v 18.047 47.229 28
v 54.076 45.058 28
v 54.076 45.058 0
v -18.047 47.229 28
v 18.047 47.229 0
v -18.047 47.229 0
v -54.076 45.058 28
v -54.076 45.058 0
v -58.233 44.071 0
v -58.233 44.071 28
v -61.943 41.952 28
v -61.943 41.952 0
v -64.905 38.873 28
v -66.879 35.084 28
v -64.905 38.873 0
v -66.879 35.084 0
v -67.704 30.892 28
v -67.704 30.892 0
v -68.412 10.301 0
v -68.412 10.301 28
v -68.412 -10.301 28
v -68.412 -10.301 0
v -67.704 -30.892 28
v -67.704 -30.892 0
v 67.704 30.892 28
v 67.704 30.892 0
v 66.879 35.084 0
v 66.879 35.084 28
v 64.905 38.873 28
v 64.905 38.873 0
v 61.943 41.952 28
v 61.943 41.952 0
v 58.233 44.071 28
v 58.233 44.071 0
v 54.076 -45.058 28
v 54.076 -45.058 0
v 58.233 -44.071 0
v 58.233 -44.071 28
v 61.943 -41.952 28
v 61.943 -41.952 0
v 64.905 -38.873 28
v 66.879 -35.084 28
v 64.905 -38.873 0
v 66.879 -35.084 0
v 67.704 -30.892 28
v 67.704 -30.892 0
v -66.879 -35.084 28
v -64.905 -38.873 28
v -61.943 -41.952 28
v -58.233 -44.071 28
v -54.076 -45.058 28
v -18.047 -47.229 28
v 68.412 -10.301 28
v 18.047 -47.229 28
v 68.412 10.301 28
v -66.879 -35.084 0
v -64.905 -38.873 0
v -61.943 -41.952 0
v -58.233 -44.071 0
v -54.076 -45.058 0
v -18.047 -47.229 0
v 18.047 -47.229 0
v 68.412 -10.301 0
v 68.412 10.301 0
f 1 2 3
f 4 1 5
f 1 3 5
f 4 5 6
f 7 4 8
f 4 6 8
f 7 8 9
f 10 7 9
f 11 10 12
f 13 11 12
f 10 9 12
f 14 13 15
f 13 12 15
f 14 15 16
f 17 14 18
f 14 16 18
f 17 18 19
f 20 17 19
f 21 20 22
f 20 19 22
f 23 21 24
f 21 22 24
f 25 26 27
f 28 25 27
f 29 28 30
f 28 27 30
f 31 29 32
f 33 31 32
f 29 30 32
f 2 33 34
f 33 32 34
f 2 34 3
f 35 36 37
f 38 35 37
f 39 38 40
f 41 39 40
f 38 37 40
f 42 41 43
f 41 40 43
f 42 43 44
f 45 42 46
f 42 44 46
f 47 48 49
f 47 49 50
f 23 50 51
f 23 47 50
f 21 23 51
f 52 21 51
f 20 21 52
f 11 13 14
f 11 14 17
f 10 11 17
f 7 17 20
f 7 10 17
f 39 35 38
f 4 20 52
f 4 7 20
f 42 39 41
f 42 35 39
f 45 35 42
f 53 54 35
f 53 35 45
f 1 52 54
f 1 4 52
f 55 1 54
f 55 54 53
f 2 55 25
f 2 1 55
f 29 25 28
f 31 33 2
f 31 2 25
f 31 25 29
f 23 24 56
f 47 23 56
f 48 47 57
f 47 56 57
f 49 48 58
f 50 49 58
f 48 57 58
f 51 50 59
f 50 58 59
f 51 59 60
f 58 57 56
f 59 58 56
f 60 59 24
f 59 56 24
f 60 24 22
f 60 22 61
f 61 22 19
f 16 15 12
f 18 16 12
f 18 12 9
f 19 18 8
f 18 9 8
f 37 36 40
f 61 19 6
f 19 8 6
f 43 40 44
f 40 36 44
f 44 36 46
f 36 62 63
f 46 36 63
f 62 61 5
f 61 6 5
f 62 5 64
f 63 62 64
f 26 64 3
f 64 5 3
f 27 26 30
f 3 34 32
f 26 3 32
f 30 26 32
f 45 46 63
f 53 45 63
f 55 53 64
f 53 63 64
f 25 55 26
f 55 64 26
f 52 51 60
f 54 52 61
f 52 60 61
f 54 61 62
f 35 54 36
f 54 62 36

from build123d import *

# Parameters (mm, degrees)
GRUNDFORM_DEPTH = 28


with BuildPart() as part:
    # Skizze2 → Grundform (new body)
    with BuildSketch(Plane.XY):
        with BuildLine():
            ThreePointArc((54.076028974, 45.058183854), (0, 47.5), (-54.076028974, 45.058183854))
            ThreePointArc((-54.076028974, 45.058183854), (-63.534180091, 40.5184013), (-67.704234102, 30.891517187))
            ThreePointArc((-67.704234102, 30.891517187), (-68.5, 0), (-67.704234102, -30.891517187))
            ThreePointArc((-67.704234102, -30.891517187), (-63.534180091, -40.5184013), (-54.076028974, -45.058183854))
            ThreePointArc((-54.076028974, -45.058183854), (0, -47.5), (54.076028974, -45.058183854))
            ThreePointArc((54.076028974, -45.058183854), (63.534180091, -40.5184013), (67.704234102, -30.891517187))
            ThreePointArc((67.704234102, -30.891517187), (68.5, 0), (67.704234102, 30.891517187))
            ThreePointArc((67.704234102, 30.891517187), (63.534180091, 40.5184013), (54.076028974, 45.058183854))
        make_face()
    extrude(amount=GRUNDFORM_DEPTH)


solid = part.part
